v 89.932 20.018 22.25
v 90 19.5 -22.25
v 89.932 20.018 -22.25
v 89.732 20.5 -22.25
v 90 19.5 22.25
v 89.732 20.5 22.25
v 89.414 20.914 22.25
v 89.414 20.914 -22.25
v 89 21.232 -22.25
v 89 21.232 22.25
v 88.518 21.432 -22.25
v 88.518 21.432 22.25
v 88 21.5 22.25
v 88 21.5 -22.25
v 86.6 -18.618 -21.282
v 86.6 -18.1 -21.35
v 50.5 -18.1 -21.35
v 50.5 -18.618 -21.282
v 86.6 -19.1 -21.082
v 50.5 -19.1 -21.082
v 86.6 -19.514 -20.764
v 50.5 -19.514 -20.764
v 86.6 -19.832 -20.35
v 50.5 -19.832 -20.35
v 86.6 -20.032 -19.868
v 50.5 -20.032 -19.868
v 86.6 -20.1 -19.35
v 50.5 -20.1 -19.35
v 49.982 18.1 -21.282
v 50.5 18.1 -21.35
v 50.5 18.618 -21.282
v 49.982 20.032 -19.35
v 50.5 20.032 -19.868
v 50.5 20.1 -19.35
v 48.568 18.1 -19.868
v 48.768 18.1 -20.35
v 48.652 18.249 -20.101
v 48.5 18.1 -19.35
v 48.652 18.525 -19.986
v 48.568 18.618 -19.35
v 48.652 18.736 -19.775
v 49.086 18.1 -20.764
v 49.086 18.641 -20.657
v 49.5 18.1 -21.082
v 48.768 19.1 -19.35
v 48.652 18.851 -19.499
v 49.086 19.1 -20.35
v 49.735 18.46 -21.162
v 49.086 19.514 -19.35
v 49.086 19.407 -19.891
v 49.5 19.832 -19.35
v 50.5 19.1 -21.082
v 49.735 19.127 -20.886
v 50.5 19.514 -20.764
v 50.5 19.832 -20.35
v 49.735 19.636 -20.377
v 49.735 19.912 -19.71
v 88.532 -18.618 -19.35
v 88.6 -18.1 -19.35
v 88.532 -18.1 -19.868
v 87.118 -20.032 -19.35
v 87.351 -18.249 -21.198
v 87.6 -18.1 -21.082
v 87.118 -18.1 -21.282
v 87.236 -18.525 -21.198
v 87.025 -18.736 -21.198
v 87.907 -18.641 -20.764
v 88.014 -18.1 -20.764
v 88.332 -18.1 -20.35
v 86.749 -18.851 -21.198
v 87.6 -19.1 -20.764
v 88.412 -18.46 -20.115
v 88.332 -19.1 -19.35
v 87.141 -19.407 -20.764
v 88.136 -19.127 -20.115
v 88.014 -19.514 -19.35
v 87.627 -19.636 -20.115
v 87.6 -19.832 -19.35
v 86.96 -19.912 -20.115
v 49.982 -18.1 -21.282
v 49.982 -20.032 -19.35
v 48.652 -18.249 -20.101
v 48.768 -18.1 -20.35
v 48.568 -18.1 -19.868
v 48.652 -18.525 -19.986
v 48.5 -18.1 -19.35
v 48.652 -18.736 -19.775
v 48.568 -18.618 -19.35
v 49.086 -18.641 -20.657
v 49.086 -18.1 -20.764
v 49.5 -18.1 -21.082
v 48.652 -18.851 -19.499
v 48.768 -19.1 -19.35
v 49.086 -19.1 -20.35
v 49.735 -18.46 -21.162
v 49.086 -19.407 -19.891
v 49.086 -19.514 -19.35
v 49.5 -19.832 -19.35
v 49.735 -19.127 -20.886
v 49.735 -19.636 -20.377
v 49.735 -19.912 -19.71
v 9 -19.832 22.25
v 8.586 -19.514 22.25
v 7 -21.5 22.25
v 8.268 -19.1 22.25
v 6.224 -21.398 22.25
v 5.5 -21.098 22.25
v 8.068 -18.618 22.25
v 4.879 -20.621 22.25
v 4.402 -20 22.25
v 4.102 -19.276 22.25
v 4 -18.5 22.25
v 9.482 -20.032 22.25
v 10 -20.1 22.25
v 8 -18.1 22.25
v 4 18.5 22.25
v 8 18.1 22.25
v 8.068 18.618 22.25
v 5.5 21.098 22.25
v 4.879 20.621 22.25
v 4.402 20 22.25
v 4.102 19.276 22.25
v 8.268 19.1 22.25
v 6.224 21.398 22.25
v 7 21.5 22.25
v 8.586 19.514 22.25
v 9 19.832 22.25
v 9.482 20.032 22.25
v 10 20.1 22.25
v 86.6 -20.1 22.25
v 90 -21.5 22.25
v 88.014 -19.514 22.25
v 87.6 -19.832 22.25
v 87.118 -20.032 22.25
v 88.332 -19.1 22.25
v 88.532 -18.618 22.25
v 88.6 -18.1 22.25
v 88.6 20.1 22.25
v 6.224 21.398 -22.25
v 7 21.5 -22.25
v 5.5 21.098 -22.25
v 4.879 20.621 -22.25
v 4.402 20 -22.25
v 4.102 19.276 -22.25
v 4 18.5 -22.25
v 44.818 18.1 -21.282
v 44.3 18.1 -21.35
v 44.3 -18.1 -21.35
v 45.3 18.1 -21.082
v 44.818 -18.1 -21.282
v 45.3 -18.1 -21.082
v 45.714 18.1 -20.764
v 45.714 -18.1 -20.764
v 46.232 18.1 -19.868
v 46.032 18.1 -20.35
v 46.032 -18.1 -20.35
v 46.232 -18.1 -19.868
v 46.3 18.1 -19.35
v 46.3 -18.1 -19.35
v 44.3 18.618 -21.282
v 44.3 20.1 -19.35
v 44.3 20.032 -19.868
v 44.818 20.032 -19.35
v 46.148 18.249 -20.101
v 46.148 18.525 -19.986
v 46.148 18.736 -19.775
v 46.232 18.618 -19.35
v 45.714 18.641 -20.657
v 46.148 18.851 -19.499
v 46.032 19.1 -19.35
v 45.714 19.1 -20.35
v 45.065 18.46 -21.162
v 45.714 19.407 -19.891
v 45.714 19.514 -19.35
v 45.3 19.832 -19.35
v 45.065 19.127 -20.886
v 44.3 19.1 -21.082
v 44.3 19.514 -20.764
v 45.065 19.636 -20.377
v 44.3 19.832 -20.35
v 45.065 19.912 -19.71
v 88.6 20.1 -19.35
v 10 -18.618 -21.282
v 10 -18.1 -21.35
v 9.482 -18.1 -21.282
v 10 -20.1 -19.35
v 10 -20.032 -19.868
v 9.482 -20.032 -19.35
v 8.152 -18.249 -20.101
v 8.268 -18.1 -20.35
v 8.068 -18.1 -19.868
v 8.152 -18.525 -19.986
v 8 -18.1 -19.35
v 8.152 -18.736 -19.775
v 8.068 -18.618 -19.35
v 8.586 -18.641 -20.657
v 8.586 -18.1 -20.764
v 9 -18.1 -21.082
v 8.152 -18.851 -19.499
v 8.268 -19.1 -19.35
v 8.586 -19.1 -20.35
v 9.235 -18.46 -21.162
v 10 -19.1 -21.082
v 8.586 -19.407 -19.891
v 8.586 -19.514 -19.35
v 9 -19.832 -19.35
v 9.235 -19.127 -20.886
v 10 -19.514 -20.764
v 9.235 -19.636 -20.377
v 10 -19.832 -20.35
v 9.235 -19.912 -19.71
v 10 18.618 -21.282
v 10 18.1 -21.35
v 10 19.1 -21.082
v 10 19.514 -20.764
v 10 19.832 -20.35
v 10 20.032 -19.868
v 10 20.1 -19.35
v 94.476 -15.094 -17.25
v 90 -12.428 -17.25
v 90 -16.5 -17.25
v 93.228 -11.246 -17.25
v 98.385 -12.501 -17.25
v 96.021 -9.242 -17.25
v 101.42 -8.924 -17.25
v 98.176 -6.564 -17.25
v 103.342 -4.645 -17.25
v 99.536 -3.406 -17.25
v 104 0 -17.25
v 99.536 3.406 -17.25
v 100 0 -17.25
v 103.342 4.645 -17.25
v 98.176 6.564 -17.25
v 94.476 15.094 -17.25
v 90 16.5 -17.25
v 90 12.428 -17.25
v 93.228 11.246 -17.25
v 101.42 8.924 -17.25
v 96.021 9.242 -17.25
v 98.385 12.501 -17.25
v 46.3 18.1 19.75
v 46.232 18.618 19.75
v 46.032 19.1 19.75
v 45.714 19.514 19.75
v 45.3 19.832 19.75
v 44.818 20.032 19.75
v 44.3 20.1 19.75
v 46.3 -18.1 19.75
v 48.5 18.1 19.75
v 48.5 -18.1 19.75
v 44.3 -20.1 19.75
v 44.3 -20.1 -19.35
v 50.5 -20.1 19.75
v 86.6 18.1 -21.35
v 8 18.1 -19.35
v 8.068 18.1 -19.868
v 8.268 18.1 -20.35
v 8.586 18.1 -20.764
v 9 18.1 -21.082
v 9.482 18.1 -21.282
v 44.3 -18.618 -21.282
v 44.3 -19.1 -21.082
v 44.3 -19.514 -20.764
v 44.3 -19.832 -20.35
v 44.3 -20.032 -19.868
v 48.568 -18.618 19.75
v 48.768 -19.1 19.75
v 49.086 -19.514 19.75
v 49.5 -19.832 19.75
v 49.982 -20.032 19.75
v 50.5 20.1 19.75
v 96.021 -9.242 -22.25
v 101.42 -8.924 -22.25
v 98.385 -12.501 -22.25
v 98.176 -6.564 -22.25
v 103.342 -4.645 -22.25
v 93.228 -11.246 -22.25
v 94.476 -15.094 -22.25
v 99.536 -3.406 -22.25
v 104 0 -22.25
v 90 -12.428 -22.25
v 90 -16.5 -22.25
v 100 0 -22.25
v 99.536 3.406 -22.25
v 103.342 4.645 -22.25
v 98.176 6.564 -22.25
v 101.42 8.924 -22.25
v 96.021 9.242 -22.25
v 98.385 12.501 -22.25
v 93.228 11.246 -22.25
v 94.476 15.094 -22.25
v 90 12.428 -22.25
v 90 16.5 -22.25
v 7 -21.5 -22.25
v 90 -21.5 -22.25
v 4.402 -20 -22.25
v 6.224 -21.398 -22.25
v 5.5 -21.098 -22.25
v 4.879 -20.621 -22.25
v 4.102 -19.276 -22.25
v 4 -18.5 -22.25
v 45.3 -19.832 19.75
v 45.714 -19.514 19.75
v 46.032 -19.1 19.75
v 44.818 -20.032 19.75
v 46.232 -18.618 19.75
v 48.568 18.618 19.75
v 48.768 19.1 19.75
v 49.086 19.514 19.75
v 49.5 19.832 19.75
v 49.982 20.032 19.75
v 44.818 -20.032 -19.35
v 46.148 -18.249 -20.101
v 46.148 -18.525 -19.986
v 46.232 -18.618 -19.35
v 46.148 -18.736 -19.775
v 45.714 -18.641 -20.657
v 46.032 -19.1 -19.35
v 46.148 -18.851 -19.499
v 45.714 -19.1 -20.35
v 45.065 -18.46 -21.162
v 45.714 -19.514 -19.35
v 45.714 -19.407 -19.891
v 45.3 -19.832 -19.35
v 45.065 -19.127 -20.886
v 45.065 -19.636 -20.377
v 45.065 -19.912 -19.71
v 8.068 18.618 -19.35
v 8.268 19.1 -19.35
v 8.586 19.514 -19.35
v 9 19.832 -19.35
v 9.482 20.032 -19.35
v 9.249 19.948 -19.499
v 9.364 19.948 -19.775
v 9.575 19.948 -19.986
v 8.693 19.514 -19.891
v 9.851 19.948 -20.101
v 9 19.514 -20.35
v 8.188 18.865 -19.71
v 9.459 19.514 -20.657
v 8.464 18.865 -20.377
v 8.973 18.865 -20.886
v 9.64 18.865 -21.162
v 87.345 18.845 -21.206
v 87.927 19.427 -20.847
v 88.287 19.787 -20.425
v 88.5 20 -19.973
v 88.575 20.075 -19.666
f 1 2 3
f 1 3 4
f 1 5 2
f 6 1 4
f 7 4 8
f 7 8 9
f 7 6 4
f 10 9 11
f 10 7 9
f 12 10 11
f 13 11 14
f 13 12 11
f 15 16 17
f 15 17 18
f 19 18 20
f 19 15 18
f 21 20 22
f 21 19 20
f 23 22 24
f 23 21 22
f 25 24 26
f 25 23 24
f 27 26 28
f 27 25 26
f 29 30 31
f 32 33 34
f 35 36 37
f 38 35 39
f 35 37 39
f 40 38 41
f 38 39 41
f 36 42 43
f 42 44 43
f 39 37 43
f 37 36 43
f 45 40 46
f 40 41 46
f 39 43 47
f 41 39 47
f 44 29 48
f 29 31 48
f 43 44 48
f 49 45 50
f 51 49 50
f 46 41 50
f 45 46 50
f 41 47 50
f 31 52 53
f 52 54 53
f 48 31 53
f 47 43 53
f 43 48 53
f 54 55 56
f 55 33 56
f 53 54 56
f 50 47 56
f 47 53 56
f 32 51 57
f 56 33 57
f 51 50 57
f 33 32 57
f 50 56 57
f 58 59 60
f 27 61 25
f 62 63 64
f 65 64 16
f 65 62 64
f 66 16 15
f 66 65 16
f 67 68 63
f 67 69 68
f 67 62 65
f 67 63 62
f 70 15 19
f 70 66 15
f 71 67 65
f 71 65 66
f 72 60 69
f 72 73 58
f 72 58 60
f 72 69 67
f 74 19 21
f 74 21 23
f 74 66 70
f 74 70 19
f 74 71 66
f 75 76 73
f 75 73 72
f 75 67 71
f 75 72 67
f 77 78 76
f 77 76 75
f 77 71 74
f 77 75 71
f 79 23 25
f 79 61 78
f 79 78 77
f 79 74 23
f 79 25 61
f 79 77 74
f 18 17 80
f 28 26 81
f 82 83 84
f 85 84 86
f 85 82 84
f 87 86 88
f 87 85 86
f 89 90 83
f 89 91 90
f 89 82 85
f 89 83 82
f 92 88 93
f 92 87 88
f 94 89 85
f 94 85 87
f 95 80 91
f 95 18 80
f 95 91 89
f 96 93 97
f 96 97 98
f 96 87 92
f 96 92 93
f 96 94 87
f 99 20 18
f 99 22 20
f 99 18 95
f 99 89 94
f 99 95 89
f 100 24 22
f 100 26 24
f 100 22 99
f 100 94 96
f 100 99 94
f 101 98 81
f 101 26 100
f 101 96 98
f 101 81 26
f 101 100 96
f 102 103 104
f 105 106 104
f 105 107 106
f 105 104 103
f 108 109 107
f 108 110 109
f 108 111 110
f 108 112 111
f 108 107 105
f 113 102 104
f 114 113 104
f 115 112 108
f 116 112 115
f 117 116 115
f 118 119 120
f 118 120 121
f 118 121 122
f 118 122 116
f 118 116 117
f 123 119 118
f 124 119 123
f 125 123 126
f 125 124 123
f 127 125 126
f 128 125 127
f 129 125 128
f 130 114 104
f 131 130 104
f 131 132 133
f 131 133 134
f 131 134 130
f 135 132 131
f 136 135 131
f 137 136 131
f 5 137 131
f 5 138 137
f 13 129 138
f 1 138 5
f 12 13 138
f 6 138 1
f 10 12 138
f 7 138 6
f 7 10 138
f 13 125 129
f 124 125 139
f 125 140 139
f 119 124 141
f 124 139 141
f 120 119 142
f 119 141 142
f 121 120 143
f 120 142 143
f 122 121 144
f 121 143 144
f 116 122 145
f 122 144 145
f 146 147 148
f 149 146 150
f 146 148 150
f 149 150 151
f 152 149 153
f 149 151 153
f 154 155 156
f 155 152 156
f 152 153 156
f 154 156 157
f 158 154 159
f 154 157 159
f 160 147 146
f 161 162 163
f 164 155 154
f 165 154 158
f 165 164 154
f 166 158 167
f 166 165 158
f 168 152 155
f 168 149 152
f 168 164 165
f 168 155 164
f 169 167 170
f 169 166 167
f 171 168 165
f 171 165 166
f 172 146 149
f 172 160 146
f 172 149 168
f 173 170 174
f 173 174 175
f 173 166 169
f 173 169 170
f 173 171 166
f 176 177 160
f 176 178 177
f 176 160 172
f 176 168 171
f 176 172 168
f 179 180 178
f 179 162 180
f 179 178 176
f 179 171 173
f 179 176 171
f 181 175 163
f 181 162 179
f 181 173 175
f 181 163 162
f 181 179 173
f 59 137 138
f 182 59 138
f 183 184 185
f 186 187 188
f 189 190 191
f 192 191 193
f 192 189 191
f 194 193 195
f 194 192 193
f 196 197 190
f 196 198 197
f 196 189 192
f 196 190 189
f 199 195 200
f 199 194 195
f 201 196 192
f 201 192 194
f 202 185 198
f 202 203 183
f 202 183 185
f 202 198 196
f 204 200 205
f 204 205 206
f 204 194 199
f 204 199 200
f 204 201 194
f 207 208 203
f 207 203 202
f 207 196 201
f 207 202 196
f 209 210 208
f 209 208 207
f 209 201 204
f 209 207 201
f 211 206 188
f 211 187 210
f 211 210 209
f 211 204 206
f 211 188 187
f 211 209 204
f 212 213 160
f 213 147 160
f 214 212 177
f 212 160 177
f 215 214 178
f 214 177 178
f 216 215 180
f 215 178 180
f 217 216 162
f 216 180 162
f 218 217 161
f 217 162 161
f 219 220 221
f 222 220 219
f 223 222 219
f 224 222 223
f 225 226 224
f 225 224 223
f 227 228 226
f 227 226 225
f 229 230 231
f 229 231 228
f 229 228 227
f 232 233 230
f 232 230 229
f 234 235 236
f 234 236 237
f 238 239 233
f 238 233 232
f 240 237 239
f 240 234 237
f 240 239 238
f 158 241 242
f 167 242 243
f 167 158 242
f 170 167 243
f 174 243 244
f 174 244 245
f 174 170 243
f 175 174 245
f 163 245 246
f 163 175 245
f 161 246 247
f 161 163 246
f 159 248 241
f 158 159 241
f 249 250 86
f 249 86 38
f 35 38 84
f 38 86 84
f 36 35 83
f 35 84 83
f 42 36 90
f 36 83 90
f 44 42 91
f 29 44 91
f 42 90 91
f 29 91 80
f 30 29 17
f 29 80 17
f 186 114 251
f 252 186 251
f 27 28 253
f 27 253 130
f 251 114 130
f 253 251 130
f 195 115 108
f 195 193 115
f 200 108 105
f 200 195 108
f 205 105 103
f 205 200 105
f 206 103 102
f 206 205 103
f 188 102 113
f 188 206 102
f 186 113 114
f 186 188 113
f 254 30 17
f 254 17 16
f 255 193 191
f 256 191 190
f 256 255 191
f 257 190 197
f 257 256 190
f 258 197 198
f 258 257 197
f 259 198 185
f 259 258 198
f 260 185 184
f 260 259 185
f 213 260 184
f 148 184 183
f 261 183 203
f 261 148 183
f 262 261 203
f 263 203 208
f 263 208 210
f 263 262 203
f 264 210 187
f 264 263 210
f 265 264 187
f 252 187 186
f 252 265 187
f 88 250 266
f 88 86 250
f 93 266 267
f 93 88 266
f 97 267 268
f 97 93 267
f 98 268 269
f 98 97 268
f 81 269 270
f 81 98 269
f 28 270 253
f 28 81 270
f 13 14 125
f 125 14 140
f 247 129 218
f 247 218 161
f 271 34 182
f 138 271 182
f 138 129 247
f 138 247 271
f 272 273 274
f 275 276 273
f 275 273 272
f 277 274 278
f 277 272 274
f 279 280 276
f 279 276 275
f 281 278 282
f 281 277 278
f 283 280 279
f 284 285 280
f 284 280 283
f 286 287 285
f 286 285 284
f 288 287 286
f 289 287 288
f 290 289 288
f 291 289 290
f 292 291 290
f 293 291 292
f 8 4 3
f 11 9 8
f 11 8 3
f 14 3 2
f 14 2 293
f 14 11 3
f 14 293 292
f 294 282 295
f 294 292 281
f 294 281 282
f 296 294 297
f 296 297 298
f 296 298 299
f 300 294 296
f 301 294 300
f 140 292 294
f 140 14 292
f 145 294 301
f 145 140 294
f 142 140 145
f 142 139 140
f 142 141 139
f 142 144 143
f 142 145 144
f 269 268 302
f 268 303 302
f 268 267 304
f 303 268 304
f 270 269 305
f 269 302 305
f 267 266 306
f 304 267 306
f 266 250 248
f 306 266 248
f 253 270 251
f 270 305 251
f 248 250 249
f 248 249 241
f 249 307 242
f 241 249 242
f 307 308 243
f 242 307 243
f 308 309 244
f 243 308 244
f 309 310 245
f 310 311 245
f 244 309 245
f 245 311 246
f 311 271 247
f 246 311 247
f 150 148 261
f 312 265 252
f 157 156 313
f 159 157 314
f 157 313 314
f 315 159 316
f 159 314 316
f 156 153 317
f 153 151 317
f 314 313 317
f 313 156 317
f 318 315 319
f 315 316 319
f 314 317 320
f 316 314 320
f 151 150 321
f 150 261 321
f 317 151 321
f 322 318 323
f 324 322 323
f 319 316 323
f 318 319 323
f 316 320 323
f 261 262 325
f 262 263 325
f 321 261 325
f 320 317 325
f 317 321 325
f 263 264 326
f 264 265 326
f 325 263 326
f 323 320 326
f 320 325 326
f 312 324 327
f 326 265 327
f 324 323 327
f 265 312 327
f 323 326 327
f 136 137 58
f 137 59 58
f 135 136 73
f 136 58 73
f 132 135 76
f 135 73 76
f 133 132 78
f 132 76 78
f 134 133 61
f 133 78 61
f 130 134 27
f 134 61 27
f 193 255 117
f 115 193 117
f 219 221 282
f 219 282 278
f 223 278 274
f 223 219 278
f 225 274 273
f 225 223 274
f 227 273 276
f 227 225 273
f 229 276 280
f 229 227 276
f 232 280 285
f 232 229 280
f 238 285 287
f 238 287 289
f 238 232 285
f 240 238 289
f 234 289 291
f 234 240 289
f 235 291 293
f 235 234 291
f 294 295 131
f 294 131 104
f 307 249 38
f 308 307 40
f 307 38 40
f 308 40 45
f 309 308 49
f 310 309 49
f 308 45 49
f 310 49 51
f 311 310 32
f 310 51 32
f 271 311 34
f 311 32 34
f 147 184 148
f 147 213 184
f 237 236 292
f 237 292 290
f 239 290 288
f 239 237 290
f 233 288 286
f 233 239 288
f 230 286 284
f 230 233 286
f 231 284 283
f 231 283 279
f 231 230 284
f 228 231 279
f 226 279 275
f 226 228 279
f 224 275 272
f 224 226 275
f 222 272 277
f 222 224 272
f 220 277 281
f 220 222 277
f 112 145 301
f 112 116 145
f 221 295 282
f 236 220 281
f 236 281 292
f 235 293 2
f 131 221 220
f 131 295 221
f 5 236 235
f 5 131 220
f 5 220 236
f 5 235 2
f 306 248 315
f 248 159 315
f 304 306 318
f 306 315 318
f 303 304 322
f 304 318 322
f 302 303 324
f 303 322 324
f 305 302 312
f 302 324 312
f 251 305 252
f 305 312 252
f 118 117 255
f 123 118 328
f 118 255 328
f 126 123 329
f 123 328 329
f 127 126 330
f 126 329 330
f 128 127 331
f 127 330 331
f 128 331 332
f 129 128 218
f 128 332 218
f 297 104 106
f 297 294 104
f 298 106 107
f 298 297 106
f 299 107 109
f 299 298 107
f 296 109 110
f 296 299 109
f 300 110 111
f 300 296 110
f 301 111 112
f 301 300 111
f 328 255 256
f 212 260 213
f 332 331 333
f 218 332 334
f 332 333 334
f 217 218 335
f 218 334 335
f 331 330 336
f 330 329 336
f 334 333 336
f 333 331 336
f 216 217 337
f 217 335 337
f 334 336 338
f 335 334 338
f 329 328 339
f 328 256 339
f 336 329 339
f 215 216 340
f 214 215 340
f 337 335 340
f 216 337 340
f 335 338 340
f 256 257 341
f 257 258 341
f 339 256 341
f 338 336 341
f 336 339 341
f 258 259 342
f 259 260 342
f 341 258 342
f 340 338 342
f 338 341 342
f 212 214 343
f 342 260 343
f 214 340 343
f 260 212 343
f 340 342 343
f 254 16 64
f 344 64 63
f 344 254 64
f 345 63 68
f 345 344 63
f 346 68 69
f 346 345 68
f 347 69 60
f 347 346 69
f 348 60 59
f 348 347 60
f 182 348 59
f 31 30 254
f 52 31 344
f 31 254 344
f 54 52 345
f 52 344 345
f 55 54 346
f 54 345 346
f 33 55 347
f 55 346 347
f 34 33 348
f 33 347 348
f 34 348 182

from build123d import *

# Parameters (mm, degrees)
SKETCH_1_W                  = 86
SKETCH_1_H                  = 43
EXTRUDE_1_DEPTH             = 39.5
EXTRUDE_2_DEPTH             = 5
SKETCH_3_W                  = 80.6
SKETCH_3_H                  = 40.2
CUT_EXTRUDE_1_DEPTH         = 43.6
HOLE_WIZARD_8_3_8_3_1_D     = 8.3
HOLE_WIZARD_8_3_8_3_1_DEPTH = 3.2
FILLET_1_R                  = 3
EXTRUDE_START               = -4
SKETCH_6_R                  = 4.15
EXTRUDE_3_DEPTH             = 4
SKETCH_10_W                 = 2.2
SKETCH_10_H                 = 43
EXTRUDE_5_DEPTH             = 42
FILLET_2_R                  = 2


with BuildPart() as part:
    # Эскиз1 → Бобышка-Вытянуть1 (new body)
    with BuildSketch(Plane.XY.offset(22.25)):
        with Locations((47, 0)):
            Rectangle(SKETCH_1_W, SKETCH_1_H)
    extrude(amount=-EXTRUDE_1_DEPTH)

    # Эскиз2 → Бобышка-Вытянуть2 (add)
    with BuildSketch(Plane(origin=(0, 0, -17.25), x_dir=(-1, 0, 0), z_dir=(0, 0, -1))):
        with BuildLine():
            Line((-90, -21.5), (-90, -16.5))
            ThreePointArc((-90, -16.5), (-104, 0), (-90, 16.5))
            Line((-90, 16.5), (-90, 21.5))
            Line((-90, 21.5), (-4, 21.5))
            Line((-4, 21.5), (-4, -21.5))
            Line((-4, -21.5), (-90, -21.5))
        make_face()
        with BuildLine():
            Line((-90, -12.428366172), (-90, 12.428366172))
            ThreePointArc((-90, 12.428366172), (-100, 0), (-90, -12.428366172))
        make_face(mode=Mode.SUBTRACT)
    extrude(amount=EXTRUDE_2_DEPTH)

    # Эскиз3 → Вырез-Вытянуть1 (cut)
    with BuildSketch(Plane.XY.offset(22.25)):
        with Locations((48.3, 0)):
            Rectangle(SKETCH_3_W, SKETCH_3_H)
    extrude(amount=-CUT_EXTRUDE_1_DEPTH, mode=Mode.SUBTRACT)

    # Диаметр отверстия Ø8.3 (8.3)1
    with Locations(Plane.ZY.offset(-4)):
        with Locations((0, 0)):
            Hole(HOLE_WIZARD_8_3_8_3_1_D / 2, depth=HOLE_WIZARD_8_3_8_3_1_DEPTH)

    # Скругление1
    fillet_1_edges = [part.edges().sort_by_distance(p)[0] for p in [
        (4, -21.5, 0),
        (4, 21.5, 0),
    ]]
    fillet(fillet_1_edges, radius=FILLET_1_R)

    # Эскиз6 → Бобышка-Вытянуть3 (add)
    with BuildSketch(Plane.ZY.offset(-4).offset(EXTRUDE_START)):
        Circle(SKETCH_6_R)
    extrude(amount=EXTRUDE_3_DEPTH)

    # Эскиз10 → Бобышка-Вытянуть5 (add)
    with BuildSketch(Plane(origin=(0, 0, -22.25), x_dir=(-1, 0, 0), z_dir=(0, 0, -1))):
        with Locations((-47.4, 0)):
            Rectangle(SKETCH_10_W, SKETCH_10_H)
    extrude(amount=-EXTRUDE_5_DEPTH)

    # Скругление2
    fillet_2_edges = [part.edges().sort_by_distance(p)[0] for p in [
        (27.15, -20.1, -21.35),
        (88.6, -20.1, 0.45),
        (8, 0, -21.35),
        (8, -20.1, 0.45),
        (68.55, 20.1, -21.35),
        (8, 20.1, 0.45),
        (88.6, 0, -21.35),
        (68.55, -20.1, -21.35),
        (27.15, 20.1, -21.35),
        (48.5, 0, -21.35),
        (46.3, 0, -21.35),
        (90, 21.5, 0),
        (46.3, -20.1, -0.8),
        (46.3, 20.1, -0.8),
        (48.5, -20.1, -0.8),
        (48.5, 20.1, -0.8),
    ]]
    fillet(fillet_2_edges, radius=FILLET_2_R)


solid = part.part
